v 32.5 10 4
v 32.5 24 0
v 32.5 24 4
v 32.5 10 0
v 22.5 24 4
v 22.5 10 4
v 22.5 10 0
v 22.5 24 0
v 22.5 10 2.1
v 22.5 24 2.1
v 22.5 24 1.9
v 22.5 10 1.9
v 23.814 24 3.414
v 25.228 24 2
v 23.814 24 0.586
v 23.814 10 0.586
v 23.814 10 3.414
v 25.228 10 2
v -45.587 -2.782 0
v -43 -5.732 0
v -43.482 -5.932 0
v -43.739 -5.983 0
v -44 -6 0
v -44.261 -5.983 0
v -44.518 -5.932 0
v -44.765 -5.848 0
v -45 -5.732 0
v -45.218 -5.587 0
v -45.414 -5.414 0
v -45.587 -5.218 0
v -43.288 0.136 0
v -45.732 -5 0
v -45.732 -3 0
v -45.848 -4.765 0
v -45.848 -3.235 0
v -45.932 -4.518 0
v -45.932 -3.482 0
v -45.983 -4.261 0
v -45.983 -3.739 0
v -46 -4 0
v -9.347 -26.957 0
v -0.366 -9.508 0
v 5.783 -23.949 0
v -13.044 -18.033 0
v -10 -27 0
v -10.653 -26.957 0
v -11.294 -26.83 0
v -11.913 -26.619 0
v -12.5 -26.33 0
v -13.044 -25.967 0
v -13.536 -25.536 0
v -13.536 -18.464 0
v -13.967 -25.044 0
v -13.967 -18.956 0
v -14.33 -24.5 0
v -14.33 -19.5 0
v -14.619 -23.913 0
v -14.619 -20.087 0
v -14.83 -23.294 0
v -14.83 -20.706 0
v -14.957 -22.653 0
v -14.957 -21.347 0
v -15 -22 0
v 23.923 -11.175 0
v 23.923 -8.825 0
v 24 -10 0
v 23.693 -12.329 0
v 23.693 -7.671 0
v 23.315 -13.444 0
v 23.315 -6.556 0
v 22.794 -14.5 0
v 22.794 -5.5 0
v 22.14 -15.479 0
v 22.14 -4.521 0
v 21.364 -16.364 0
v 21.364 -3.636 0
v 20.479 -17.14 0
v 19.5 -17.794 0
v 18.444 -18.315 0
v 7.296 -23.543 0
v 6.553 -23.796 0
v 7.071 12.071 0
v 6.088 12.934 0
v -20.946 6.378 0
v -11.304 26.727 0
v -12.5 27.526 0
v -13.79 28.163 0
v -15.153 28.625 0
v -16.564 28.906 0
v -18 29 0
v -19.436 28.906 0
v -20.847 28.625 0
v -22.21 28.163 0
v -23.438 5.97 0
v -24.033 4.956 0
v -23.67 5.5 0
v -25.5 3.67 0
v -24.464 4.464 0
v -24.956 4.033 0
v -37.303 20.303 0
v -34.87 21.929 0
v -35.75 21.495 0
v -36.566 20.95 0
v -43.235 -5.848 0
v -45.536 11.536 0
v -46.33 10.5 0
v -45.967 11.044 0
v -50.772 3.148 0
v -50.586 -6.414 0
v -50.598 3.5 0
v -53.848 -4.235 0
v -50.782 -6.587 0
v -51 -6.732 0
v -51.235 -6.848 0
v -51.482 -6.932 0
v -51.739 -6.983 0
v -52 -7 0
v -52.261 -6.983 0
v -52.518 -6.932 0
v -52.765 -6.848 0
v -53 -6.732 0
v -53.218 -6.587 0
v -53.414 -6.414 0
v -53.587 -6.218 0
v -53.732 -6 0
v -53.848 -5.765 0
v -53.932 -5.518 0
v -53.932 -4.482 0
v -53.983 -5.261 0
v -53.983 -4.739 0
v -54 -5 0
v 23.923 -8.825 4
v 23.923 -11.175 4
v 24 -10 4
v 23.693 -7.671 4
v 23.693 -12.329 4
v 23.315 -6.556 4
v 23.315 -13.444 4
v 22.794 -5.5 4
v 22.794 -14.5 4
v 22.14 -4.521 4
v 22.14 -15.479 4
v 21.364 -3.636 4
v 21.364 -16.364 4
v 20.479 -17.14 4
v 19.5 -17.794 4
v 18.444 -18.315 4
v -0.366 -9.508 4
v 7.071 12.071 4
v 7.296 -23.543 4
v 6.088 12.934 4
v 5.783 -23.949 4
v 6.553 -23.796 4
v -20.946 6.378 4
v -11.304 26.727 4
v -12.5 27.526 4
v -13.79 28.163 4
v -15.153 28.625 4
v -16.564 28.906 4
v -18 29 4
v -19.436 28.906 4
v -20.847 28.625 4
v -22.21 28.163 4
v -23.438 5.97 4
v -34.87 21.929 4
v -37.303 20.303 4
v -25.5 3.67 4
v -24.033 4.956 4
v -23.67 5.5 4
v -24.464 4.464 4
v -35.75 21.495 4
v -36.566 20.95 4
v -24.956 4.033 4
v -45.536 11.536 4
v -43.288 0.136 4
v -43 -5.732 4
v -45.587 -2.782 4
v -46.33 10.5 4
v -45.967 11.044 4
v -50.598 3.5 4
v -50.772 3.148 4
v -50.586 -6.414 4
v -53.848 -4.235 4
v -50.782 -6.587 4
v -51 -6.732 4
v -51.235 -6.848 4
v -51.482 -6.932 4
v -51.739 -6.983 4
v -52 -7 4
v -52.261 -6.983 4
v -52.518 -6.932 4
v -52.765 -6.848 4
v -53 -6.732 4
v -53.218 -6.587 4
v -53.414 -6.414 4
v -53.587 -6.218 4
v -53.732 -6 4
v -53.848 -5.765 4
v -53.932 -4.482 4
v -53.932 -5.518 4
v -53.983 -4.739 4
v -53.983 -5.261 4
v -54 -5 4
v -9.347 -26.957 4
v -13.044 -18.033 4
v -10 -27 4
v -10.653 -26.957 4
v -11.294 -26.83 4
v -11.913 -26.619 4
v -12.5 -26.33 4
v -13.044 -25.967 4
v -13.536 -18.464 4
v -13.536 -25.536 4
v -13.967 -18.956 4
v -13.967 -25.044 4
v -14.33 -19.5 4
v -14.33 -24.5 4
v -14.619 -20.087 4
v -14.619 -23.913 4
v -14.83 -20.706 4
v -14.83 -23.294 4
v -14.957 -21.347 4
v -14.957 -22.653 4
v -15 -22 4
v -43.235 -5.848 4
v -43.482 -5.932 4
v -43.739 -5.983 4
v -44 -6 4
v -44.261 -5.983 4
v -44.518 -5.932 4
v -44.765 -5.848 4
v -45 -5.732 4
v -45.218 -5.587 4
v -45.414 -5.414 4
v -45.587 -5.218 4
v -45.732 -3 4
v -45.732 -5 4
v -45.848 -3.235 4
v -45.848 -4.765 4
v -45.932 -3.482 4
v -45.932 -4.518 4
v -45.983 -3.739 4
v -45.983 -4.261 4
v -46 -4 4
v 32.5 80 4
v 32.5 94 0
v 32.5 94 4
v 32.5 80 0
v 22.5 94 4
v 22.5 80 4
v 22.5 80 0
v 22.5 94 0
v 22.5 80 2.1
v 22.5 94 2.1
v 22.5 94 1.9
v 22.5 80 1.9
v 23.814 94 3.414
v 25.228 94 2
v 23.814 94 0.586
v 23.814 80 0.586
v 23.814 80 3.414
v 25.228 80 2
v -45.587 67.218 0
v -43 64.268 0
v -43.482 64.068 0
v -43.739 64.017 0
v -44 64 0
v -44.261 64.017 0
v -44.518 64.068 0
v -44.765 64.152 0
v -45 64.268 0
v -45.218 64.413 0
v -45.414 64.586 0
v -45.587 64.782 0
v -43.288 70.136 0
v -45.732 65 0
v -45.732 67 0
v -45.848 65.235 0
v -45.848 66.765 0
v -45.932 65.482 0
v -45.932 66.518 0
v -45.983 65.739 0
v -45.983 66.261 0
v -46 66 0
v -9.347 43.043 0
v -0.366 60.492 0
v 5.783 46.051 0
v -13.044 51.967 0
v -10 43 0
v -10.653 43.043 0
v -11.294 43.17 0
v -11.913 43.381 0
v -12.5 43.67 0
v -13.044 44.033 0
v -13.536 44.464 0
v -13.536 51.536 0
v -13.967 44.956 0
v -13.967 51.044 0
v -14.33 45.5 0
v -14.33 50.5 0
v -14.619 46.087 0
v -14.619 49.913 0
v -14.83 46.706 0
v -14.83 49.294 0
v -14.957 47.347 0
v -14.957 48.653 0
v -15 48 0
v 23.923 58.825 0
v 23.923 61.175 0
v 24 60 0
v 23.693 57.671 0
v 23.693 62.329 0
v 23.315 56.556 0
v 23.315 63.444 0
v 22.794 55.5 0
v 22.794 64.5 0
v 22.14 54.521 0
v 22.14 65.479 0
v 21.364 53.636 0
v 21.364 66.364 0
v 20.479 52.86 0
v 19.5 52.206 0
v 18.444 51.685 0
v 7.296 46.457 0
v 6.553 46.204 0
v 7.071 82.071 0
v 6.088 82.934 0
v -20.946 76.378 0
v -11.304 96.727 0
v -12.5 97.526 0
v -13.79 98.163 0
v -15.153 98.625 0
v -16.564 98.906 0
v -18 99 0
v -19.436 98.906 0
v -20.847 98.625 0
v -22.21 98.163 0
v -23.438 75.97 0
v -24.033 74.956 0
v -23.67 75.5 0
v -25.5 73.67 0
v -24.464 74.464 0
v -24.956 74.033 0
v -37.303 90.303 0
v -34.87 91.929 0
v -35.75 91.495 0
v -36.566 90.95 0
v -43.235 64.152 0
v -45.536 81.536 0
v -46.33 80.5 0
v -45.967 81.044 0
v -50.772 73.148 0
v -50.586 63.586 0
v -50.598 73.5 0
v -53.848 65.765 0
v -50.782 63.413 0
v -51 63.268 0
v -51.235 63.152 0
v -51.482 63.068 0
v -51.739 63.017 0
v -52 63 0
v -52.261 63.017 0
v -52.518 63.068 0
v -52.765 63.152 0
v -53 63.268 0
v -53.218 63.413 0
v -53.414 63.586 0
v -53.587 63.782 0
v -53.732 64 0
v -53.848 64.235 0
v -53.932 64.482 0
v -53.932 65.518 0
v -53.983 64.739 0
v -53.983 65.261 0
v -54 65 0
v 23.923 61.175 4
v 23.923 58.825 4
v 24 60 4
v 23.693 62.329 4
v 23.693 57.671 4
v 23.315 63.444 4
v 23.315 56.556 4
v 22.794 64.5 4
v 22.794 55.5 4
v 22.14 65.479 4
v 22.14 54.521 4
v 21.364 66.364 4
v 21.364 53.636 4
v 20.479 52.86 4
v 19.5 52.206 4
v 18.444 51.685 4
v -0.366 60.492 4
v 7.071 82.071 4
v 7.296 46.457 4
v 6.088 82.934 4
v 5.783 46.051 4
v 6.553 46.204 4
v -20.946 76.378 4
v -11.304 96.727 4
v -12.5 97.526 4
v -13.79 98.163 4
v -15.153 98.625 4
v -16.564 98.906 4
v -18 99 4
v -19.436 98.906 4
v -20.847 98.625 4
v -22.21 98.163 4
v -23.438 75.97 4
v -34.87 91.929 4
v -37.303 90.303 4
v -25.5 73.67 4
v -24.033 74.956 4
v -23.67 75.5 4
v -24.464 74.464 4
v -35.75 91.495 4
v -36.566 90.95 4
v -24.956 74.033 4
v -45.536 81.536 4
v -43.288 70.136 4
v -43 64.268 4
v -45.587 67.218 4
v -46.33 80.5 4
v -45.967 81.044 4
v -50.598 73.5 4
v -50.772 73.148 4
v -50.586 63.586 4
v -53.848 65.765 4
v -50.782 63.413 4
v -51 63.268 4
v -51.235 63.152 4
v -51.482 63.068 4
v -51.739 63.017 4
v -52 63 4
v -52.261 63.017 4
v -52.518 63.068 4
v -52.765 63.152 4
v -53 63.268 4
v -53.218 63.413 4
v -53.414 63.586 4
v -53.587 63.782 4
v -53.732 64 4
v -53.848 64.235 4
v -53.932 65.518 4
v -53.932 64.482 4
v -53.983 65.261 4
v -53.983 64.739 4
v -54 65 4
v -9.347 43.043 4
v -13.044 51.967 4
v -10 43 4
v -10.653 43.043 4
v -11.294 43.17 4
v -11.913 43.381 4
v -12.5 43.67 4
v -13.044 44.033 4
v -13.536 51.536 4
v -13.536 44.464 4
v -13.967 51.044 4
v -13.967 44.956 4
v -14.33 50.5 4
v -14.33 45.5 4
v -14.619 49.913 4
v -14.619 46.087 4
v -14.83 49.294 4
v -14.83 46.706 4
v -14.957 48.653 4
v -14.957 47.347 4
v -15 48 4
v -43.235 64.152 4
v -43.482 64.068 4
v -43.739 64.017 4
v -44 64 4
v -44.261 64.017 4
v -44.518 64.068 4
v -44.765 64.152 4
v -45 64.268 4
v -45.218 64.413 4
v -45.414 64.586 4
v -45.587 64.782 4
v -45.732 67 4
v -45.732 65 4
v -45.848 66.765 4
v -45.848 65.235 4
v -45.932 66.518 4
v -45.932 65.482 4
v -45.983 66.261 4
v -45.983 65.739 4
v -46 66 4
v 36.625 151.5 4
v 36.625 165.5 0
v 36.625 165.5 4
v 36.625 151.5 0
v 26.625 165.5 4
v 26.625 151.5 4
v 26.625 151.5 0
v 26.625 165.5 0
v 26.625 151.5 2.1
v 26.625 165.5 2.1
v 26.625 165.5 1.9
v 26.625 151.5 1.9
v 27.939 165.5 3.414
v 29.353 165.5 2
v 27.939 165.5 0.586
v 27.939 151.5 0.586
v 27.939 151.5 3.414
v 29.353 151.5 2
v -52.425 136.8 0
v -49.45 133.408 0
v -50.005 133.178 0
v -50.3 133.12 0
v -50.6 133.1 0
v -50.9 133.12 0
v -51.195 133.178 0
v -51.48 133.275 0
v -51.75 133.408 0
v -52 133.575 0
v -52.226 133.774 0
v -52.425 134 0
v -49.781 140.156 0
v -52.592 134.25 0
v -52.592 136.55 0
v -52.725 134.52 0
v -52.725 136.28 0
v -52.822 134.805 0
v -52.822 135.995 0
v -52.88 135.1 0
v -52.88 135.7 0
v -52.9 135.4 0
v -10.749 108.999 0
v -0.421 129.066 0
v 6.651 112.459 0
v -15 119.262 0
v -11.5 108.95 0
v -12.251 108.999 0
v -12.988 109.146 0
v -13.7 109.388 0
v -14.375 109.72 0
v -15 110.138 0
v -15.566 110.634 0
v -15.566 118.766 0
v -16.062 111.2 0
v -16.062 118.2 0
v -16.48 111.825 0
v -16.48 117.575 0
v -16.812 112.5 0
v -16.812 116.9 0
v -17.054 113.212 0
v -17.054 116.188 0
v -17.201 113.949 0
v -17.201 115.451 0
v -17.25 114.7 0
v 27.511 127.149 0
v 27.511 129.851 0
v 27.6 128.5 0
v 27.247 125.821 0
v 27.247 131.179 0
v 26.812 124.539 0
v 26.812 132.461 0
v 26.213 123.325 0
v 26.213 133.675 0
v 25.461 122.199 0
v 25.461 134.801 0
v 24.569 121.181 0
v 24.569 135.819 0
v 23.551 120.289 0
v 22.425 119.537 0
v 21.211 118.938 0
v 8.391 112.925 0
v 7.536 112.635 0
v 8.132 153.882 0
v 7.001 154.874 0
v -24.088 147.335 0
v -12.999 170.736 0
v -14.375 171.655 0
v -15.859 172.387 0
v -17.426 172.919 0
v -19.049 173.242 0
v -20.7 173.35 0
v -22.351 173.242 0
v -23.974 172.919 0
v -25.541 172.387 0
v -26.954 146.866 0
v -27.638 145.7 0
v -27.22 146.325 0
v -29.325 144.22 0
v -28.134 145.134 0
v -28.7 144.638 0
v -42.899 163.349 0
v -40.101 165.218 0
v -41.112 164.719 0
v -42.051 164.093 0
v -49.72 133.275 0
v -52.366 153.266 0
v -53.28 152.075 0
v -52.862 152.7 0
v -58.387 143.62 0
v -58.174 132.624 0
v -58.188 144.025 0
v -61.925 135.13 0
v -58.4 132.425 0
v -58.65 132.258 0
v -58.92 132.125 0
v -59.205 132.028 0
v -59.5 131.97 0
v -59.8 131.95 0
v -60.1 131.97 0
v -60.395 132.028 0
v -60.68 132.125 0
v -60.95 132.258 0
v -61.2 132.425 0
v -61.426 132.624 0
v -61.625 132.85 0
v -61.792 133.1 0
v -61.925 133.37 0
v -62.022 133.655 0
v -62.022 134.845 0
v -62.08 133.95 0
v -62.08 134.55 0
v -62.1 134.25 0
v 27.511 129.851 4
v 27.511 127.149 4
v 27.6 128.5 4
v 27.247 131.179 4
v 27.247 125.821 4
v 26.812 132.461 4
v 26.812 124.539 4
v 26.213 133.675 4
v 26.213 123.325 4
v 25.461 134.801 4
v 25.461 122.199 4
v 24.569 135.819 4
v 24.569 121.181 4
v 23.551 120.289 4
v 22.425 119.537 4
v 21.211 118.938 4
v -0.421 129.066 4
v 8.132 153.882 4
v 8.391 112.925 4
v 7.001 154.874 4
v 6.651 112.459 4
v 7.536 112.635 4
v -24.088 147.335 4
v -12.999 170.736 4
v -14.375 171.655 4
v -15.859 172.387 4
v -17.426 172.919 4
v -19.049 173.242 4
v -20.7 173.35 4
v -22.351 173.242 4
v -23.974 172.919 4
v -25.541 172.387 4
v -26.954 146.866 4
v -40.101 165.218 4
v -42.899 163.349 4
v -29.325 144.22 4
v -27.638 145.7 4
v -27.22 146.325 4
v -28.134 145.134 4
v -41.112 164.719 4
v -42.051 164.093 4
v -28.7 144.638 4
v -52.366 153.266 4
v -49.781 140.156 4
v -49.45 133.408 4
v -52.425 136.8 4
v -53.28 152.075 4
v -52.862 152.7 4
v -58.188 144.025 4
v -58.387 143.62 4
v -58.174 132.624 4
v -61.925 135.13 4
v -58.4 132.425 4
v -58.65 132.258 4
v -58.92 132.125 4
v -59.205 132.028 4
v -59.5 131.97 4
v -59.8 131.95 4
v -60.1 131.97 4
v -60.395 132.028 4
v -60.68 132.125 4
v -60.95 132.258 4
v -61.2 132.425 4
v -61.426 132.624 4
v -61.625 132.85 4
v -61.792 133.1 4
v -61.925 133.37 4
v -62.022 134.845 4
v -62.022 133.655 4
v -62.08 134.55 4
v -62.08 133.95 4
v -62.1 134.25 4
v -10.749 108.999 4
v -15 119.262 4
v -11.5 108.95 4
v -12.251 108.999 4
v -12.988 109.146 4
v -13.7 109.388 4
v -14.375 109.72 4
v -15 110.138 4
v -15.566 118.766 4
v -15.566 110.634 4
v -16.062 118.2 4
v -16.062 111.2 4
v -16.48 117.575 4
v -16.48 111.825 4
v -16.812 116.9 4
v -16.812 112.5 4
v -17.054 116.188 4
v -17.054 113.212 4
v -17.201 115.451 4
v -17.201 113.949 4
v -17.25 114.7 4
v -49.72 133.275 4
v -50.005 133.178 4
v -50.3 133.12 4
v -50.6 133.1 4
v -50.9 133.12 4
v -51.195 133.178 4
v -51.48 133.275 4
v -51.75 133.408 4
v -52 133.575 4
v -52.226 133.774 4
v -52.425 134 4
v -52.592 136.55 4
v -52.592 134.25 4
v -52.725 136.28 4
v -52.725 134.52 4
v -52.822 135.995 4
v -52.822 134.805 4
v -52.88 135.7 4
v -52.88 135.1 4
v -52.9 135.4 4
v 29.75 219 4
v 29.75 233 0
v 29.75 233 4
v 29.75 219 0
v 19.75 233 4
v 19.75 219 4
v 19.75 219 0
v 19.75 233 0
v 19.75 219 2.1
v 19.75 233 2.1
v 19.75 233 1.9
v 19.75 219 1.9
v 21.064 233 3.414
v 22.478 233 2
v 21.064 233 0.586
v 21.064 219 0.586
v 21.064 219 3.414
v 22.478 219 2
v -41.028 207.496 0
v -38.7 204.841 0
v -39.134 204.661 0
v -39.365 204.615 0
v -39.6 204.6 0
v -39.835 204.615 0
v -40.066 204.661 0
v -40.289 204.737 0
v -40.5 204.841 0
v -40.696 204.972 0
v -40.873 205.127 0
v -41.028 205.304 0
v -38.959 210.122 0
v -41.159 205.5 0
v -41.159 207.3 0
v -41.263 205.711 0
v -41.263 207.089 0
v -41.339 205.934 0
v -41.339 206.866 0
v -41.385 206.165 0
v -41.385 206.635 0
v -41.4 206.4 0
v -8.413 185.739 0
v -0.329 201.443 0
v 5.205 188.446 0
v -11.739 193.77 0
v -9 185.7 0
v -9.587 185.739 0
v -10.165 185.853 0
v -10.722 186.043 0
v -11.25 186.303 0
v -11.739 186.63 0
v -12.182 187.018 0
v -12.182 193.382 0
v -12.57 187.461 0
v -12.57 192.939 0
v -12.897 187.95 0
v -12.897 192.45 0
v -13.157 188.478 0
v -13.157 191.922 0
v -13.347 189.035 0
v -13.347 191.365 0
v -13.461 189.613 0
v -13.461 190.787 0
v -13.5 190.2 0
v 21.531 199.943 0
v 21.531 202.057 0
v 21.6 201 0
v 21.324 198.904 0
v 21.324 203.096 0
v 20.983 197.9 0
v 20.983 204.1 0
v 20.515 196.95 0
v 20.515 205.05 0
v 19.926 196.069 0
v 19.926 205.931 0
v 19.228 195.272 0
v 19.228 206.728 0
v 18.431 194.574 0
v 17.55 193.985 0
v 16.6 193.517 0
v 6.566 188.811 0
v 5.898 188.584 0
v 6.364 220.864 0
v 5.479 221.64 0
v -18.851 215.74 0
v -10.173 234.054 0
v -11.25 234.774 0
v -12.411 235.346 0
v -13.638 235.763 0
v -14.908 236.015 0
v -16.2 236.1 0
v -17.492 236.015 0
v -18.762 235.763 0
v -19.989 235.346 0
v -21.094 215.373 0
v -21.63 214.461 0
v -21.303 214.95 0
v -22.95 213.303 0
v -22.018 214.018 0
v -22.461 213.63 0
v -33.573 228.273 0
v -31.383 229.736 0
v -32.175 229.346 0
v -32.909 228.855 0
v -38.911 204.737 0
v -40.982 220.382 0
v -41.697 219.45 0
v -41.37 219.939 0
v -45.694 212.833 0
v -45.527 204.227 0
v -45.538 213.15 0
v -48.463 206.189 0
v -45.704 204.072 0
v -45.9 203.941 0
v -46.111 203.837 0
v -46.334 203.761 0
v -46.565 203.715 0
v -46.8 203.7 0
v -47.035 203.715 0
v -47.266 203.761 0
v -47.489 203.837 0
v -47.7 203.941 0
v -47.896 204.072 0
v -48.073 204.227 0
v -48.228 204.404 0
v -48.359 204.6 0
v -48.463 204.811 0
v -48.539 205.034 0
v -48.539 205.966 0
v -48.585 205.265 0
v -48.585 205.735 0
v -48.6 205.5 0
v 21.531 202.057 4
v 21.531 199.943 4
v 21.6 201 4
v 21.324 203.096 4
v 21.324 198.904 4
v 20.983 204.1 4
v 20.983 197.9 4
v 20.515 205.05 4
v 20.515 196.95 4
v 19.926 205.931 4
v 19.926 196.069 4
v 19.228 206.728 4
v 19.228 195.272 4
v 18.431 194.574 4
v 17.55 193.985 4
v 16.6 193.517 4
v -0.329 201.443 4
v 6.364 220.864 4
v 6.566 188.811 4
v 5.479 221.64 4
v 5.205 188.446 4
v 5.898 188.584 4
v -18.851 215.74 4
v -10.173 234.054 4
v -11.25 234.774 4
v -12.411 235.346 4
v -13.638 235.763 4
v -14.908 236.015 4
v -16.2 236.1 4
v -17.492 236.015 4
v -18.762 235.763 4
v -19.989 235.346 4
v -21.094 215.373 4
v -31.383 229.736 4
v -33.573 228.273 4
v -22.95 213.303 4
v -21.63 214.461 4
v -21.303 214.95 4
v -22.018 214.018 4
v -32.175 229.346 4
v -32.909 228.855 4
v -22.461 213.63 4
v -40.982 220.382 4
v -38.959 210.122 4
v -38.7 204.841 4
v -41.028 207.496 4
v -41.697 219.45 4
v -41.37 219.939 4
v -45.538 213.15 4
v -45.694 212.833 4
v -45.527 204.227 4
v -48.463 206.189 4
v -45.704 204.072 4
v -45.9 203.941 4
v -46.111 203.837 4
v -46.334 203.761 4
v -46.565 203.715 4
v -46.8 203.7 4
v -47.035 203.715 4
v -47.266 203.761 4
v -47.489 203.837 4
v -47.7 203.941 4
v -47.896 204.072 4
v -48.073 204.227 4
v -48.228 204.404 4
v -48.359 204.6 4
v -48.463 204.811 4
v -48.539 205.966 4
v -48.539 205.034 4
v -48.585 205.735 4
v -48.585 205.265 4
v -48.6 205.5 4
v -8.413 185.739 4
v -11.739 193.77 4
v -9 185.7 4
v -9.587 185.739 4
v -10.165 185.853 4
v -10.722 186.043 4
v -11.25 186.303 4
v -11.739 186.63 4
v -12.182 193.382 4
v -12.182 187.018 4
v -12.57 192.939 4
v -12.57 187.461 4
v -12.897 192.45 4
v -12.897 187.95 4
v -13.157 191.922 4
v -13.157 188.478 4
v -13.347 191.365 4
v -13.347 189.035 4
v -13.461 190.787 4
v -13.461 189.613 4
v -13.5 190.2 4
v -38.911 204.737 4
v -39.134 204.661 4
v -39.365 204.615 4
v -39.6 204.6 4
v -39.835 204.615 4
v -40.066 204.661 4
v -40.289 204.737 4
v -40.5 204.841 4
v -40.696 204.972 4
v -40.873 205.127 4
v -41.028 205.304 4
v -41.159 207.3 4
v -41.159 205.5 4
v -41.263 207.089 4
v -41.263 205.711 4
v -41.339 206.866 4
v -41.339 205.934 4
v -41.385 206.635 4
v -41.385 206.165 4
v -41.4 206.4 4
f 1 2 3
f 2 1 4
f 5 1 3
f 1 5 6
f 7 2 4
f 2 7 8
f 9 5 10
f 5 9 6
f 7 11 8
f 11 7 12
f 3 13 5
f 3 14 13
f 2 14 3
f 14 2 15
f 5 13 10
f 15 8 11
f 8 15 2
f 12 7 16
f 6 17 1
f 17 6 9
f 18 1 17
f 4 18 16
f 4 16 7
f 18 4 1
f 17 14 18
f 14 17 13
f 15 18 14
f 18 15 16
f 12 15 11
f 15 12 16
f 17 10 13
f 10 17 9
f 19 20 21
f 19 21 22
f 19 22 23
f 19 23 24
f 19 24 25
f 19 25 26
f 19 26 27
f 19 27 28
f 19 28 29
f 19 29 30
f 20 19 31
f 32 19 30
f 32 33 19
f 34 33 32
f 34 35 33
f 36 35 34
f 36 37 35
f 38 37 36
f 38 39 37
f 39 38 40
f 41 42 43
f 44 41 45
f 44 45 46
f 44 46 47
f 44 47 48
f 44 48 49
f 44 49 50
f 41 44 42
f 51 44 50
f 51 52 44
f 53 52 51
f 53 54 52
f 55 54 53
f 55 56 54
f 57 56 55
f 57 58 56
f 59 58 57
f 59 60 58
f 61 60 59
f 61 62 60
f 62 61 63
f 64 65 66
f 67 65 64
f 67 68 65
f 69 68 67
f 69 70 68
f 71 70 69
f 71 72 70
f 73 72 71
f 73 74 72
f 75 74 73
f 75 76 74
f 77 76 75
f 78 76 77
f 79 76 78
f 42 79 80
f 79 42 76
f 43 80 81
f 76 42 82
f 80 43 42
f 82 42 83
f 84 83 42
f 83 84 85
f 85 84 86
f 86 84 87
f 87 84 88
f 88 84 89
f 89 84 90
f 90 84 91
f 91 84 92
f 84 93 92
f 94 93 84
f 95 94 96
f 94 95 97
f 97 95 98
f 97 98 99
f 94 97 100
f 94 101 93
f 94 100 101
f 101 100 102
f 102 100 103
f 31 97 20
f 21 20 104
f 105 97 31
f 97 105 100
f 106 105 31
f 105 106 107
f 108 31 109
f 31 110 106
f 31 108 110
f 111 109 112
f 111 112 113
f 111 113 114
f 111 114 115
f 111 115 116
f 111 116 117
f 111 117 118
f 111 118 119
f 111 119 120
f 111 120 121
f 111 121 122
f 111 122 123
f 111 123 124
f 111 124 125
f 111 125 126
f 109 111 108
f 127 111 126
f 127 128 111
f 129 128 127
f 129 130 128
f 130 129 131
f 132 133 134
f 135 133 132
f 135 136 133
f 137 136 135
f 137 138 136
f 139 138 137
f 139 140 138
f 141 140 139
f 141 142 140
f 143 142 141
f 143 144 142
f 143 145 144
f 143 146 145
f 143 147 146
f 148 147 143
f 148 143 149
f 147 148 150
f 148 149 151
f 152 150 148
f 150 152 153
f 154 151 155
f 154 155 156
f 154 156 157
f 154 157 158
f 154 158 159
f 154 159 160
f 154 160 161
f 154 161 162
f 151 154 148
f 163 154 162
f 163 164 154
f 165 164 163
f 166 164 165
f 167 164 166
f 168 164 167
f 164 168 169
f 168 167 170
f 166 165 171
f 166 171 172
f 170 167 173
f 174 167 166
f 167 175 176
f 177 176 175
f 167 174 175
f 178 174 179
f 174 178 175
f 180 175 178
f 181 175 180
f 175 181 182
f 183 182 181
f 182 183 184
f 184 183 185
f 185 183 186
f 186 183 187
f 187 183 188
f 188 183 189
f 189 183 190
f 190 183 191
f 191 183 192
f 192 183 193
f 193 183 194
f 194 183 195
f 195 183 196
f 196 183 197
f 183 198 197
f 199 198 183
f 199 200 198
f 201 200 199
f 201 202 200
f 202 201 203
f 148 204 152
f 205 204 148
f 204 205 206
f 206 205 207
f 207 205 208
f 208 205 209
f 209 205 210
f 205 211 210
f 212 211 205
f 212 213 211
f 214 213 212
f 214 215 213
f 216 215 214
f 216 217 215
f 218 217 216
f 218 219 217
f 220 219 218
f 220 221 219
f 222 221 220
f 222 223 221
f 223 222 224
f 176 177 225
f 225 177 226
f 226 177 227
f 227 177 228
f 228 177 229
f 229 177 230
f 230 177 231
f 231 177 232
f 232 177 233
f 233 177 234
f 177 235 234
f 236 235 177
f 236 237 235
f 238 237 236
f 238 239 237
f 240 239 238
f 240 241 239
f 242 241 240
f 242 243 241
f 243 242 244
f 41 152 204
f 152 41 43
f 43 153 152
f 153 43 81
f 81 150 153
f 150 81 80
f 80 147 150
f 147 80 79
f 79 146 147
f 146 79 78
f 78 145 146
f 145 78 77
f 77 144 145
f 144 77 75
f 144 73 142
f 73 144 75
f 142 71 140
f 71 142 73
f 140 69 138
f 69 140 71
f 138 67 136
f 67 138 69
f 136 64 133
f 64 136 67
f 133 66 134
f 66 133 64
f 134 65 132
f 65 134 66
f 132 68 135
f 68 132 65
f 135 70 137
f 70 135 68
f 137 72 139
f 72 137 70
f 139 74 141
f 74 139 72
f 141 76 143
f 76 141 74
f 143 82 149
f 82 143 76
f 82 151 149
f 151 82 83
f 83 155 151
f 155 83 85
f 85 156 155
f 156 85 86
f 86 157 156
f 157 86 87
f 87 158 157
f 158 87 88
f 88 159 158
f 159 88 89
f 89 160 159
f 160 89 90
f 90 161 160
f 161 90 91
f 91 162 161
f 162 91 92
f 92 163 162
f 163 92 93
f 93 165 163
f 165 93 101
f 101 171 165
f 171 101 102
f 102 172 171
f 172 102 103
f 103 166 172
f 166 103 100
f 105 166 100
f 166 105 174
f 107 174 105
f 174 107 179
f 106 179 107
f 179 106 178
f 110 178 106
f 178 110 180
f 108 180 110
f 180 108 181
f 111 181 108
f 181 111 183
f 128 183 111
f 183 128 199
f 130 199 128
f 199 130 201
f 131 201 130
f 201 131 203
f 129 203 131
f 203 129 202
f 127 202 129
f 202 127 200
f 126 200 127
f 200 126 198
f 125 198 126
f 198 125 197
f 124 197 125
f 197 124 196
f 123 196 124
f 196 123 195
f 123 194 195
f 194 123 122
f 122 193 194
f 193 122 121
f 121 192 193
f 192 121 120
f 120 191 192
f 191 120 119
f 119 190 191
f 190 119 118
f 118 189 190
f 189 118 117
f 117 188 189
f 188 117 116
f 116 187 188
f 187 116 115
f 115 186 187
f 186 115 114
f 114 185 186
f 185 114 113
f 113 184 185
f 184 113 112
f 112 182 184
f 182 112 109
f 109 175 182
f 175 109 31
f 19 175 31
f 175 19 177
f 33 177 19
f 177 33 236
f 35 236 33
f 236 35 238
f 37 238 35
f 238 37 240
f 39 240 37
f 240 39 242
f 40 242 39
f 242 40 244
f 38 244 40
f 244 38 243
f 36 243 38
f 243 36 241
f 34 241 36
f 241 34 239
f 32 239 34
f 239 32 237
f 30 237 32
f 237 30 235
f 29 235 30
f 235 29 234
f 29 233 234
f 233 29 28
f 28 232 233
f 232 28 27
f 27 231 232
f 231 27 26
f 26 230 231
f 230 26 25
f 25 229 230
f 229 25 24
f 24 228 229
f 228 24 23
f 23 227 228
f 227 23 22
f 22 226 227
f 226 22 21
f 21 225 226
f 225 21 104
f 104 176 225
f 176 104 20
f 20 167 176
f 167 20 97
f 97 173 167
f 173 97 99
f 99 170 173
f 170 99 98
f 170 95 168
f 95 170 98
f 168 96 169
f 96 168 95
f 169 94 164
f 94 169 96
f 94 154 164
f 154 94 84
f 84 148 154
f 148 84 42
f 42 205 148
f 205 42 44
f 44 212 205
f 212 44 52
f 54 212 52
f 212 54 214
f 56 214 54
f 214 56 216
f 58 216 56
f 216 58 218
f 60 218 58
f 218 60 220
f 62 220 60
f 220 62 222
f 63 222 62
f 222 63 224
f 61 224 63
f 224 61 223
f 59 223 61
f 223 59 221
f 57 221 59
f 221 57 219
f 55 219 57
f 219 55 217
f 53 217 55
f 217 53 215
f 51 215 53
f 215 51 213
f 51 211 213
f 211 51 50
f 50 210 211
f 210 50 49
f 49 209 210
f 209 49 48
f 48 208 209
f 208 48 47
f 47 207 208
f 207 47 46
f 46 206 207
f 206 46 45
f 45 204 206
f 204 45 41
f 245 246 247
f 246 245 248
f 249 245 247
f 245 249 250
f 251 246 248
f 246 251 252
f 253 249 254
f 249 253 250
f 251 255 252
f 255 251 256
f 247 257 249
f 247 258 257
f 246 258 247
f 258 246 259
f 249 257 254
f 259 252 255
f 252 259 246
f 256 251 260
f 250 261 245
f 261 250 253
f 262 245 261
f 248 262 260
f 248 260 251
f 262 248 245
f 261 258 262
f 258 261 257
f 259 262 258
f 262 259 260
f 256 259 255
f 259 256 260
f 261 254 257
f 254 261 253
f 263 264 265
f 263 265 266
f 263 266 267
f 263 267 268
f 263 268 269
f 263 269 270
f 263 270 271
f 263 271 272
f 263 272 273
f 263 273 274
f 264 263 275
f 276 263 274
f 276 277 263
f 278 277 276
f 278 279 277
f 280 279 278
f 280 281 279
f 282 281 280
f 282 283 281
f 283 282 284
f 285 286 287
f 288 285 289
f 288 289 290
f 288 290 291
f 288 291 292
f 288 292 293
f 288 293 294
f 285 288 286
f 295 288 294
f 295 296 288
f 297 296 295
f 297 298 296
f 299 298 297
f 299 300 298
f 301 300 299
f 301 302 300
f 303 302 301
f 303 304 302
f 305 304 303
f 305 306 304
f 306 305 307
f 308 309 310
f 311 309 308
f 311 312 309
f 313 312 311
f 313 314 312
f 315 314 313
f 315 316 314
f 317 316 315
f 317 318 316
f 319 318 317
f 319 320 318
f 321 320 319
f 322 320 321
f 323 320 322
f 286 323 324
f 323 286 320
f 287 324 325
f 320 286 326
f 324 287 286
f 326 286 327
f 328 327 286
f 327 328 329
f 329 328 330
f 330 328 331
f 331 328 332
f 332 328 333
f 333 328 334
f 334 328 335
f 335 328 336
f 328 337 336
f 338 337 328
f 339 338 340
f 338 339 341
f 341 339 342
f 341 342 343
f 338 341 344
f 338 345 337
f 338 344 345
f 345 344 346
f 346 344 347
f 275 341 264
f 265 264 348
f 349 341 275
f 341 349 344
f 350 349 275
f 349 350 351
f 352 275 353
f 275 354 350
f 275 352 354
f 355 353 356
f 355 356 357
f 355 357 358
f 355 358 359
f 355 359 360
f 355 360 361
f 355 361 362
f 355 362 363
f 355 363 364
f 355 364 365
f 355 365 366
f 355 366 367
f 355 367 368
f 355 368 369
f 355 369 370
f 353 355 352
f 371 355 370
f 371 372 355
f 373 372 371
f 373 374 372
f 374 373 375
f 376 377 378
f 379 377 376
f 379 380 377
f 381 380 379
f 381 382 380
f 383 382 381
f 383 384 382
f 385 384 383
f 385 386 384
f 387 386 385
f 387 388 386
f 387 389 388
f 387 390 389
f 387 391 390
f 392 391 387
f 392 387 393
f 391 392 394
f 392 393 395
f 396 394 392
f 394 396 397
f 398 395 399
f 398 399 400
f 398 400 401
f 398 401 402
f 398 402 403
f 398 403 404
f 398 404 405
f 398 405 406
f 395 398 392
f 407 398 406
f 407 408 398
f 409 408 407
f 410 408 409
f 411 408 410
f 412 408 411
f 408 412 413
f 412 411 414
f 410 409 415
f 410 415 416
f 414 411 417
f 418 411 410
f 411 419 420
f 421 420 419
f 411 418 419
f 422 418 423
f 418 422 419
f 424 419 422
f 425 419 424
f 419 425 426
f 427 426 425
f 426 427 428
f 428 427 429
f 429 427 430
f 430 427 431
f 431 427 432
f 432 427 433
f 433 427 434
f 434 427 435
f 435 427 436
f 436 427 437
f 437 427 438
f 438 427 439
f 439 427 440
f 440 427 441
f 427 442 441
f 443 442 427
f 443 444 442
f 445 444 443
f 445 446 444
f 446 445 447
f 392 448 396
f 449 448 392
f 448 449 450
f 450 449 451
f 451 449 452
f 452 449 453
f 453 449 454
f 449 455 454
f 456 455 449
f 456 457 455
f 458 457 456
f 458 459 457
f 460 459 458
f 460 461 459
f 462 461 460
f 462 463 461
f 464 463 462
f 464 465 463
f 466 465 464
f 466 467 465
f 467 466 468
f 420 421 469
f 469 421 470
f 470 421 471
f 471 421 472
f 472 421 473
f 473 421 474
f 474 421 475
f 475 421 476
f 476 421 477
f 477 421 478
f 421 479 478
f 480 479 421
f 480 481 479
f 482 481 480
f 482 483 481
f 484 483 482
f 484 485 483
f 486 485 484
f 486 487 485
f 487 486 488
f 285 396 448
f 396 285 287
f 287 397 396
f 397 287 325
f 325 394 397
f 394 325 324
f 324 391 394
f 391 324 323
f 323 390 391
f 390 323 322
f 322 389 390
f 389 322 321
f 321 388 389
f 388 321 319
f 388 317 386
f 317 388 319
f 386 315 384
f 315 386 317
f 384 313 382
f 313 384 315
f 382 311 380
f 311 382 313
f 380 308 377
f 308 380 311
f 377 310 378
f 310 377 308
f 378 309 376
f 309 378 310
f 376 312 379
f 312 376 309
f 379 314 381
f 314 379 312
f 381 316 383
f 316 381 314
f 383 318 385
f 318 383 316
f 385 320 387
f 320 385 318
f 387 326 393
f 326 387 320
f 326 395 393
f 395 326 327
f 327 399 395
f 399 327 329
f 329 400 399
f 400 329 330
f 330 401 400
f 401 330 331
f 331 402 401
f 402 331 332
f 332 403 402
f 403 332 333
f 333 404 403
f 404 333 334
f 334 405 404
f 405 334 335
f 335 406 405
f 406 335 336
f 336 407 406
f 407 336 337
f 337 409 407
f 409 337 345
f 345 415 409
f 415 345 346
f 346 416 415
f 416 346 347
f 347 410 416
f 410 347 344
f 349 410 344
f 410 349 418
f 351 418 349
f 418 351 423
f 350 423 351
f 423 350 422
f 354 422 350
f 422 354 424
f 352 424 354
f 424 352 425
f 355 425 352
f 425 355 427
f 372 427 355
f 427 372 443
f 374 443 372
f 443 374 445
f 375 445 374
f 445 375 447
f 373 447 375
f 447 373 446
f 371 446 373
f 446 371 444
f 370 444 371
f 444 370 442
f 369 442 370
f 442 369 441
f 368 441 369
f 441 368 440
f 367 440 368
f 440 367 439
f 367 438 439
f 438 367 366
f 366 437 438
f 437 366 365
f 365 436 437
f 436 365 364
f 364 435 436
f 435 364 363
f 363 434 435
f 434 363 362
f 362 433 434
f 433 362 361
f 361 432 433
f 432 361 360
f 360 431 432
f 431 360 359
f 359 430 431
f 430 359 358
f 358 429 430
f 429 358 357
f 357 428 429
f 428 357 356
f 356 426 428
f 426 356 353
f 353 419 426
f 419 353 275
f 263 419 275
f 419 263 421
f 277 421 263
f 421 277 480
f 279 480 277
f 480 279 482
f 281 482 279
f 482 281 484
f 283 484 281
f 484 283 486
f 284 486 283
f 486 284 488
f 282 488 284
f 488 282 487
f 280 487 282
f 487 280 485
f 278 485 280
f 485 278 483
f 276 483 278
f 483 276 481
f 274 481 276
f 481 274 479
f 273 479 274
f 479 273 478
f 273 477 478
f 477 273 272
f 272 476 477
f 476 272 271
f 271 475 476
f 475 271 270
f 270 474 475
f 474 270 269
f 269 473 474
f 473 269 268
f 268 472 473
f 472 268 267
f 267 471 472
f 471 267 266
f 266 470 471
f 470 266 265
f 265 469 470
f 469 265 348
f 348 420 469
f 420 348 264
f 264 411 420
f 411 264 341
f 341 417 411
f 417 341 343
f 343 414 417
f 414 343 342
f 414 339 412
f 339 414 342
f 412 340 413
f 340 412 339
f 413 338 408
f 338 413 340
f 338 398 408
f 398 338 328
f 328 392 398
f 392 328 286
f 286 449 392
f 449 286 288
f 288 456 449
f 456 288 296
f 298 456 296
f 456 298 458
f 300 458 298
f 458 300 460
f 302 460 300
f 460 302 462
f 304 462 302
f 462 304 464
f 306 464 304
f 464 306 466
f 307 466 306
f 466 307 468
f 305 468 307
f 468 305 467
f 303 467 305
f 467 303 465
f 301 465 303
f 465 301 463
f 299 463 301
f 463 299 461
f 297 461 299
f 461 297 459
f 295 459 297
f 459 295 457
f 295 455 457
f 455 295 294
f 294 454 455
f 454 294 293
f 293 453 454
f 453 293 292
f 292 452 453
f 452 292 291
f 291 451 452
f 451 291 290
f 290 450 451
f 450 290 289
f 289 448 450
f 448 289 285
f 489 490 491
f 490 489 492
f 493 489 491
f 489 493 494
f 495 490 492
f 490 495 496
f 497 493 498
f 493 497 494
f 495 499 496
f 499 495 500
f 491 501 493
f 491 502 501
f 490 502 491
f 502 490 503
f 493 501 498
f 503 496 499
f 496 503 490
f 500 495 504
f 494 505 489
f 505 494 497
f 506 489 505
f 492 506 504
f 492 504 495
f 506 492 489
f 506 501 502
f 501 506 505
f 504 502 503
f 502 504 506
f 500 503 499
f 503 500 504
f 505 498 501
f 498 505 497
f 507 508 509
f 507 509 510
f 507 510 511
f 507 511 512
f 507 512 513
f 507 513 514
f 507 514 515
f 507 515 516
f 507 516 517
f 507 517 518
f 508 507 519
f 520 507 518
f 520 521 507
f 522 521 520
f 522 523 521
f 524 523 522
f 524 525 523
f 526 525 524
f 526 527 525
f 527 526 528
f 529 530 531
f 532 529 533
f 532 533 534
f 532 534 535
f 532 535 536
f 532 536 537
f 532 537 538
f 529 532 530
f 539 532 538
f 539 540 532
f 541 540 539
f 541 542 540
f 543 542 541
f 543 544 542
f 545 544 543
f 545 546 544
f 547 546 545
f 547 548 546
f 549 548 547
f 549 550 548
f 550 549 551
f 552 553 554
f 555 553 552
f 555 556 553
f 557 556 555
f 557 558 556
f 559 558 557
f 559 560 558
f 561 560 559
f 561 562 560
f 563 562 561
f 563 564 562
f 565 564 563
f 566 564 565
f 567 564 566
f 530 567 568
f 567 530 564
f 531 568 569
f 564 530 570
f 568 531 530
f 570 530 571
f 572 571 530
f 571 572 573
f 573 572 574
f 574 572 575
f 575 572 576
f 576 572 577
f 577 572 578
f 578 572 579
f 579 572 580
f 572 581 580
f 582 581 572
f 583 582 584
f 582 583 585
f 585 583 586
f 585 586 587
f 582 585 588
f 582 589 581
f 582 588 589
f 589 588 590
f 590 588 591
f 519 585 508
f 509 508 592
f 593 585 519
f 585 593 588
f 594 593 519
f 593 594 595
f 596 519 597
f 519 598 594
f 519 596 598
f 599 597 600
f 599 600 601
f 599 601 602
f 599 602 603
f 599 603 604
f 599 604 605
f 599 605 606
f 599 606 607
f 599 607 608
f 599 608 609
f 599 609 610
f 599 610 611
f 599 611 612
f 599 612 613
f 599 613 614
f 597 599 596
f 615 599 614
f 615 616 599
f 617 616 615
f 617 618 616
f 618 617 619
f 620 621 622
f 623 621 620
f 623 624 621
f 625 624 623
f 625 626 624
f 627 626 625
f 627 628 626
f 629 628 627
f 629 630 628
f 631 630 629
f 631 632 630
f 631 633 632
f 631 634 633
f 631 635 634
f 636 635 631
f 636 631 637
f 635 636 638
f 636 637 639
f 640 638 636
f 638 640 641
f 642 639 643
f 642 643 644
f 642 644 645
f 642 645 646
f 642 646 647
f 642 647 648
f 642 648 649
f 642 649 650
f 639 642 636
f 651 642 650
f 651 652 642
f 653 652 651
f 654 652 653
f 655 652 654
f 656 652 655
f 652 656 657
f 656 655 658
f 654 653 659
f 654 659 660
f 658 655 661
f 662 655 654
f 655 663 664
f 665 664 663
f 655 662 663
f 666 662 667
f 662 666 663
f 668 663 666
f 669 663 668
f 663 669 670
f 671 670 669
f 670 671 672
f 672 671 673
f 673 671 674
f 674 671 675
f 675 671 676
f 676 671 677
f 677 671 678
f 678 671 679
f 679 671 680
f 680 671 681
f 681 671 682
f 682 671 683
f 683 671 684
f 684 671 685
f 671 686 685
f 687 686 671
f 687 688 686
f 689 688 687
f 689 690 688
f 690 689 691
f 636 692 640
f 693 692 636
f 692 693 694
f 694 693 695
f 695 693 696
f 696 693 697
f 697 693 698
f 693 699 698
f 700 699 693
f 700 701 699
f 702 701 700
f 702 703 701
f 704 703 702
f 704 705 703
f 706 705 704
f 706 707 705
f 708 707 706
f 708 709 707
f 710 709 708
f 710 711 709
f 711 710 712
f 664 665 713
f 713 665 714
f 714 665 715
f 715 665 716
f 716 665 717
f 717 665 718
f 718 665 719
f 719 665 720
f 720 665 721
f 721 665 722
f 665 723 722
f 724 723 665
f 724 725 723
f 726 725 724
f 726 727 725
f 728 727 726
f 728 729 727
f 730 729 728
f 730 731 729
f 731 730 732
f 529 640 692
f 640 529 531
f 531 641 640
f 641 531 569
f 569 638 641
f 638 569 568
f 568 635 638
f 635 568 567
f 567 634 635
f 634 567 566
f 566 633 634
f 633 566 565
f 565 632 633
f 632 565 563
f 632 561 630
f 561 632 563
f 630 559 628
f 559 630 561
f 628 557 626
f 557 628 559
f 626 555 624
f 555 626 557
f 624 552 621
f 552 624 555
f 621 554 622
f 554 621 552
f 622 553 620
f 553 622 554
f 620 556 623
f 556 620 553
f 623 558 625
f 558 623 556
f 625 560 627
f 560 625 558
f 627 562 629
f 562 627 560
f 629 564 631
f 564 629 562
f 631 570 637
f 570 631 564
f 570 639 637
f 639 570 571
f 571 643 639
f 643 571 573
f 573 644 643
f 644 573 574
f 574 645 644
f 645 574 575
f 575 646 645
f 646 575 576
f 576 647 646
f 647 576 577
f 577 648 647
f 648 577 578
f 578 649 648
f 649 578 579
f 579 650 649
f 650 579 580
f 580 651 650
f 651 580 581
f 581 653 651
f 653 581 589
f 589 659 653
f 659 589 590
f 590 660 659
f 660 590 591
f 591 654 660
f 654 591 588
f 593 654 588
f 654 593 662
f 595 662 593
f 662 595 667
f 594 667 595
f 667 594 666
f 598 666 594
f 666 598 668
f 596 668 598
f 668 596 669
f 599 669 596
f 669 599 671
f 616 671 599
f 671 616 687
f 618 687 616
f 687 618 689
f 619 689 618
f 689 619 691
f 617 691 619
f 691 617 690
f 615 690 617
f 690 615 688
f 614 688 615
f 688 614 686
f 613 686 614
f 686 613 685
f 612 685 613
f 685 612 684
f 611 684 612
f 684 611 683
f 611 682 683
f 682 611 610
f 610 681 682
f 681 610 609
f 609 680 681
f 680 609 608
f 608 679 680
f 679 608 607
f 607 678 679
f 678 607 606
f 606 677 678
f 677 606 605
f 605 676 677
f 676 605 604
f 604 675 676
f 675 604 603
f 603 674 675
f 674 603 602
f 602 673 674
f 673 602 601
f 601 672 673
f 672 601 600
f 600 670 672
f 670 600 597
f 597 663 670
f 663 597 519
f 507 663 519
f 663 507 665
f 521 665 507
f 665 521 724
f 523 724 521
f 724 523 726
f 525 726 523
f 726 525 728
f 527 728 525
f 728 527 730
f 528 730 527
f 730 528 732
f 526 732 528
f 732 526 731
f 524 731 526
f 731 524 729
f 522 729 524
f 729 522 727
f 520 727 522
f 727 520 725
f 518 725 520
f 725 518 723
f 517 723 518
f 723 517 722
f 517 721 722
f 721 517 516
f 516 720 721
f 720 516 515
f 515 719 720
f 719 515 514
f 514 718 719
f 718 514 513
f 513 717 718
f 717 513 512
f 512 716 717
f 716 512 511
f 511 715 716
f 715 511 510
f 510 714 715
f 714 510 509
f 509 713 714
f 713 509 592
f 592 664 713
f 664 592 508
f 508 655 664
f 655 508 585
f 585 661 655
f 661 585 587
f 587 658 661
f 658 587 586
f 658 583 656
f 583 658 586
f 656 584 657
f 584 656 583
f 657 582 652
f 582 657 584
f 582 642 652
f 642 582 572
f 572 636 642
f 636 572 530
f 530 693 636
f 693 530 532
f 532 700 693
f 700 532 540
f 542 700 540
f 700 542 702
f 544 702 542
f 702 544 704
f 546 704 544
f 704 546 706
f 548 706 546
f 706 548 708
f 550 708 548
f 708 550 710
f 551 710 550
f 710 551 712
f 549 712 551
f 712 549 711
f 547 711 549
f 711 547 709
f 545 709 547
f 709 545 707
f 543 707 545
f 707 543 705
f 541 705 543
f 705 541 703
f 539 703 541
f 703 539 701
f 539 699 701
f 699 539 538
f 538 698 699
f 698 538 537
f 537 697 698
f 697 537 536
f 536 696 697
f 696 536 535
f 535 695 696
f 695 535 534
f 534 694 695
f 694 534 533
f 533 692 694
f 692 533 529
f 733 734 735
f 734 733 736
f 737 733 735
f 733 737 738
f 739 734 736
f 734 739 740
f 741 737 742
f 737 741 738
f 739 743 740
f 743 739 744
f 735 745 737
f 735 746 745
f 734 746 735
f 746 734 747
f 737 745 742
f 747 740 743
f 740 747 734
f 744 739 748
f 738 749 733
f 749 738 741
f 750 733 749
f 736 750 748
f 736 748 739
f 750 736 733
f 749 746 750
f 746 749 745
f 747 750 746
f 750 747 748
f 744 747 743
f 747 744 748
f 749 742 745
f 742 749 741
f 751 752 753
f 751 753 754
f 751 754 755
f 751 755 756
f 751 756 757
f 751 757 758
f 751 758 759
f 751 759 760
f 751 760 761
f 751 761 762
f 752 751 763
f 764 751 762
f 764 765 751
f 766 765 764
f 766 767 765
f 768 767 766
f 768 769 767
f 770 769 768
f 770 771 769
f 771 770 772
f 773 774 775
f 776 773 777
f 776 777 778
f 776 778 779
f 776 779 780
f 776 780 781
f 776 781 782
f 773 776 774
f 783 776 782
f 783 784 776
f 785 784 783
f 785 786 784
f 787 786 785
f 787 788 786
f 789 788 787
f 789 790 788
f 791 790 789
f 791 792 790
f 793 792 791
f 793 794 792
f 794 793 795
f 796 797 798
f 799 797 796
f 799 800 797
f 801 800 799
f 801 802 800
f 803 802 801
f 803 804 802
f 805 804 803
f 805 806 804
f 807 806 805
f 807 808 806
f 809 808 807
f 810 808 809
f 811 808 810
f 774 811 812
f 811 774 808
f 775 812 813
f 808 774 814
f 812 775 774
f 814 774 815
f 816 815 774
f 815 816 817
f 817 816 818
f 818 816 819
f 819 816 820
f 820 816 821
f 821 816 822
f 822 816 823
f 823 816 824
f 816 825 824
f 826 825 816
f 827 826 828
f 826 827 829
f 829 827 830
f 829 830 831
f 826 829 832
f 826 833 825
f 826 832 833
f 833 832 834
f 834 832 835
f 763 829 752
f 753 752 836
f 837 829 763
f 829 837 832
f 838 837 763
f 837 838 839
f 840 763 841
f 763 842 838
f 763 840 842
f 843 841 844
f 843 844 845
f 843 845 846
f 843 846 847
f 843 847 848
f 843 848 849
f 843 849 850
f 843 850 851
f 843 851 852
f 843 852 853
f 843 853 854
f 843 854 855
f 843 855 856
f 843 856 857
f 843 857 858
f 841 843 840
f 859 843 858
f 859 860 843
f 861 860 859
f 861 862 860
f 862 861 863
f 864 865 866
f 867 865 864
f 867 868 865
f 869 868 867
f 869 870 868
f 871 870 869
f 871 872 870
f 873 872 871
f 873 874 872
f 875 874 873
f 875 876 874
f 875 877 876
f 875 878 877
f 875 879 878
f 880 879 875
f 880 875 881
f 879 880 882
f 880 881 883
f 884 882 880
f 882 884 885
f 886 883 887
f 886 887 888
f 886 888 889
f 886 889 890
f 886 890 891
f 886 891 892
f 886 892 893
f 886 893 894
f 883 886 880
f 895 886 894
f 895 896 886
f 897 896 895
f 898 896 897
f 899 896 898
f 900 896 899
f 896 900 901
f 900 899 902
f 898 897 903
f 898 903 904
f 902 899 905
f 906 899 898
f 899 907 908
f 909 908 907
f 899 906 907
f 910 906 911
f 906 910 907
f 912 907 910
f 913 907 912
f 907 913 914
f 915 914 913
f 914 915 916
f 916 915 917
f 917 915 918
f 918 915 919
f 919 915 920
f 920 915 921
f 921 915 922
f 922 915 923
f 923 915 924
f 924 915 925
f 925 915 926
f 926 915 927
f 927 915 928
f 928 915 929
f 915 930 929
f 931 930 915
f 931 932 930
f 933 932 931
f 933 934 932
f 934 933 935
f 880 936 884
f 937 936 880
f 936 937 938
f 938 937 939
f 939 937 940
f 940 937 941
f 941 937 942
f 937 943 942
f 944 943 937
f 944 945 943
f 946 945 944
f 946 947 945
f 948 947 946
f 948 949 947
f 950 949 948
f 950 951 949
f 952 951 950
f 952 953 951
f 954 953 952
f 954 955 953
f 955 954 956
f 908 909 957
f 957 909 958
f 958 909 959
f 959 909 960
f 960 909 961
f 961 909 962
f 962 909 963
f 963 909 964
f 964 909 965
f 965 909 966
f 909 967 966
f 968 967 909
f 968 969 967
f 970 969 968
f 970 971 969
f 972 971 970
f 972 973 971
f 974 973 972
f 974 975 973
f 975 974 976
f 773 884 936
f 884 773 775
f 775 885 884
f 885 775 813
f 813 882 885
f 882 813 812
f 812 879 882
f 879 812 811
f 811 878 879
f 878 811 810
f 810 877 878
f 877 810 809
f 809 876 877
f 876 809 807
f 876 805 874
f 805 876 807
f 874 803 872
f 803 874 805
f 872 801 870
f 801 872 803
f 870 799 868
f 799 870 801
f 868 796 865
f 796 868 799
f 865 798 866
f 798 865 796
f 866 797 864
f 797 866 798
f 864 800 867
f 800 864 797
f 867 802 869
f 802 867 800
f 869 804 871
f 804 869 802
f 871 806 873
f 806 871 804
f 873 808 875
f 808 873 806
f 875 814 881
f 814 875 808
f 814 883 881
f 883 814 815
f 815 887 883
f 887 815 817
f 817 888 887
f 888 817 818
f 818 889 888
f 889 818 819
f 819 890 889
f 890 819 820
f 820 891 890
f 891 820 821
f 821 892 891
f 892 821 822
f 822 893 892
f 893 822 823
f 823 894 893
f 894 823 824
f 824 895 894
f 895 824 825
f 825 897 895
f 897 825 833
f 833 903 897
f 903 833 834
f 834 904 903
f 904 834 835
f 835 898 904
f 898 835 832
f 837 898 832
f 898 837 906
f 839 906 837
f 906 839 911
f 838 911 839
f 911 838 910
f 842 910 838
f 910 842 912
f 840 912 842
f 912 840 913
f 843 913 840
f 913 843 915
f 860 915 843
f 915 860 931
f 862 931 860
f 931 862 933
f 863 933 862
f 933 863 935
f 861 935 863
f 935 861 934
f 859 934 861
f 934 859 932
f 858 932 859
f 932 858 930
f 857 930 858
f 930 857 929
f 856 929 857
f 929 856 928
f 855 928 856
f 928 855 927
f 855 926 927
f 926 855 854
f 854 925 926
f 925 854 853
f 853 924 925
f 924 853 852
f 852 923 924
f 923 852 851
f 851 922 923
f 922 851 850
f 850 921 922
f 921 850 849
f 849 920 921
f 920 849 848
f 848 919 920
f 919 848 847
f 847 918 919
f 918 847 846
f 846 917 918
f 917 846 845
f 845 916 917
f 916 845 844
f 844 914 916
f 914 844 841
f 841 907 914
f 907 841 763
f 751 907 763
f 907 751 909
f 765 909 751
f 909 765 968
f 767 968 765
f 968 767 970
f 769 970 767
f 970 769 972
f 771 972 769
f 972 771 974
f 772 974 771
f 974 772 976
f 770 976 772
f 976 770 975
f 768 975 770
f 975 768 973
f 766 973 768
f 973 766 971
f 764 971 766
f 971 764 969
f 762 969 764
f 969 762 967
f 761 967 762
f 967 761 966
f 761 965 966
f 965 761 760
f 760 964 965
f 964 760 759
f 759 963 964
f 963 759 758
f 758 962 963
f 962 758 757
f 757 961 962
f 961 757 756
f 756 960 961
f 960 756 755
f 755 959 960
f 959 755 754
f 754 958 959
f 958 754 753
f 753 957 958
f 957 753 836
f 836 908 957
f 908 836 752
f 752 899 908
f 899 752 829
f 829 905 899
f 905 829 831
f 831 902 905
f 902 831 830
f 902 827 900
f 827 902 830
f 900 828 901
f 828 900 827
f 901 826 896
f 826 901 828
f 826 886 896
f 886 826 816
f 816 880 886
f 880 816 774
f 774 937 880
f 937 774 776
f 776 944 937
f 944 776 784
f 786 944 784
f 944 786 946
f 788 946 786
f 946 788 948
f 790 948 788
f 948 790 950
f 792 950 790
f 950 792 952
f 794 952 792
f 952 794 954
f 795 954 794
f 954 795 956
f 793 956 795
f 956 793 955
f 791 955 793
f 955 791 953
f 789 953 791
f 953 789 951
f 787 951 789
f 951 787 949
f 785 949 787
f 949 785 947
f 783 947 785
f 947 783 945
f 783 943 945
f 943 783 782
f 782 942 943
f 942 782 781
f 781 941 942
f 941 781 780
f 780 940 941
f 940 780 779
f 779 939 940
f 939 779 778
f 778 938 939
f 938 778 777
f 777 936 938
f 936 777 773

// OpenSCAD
/*
 * WAVE LAYER: CURL (Layer 1 - Middle)
 * ====================================
 *
 * Light blue, curling wave tip - the iconic Hokusai shape
 * 2D profile extruded to 4mm thickness
 * Mounting tab on right edge for slider connection
 *
 * Print: 3x (one per wave)
 * Material: Any color PLA/PETG
 * Layer height: 0.2mm
 * Infill: 15%
 */

include <../common.scad>

// ============================================
// CURL PROFILE PARAMETERS
// ============================================

// Base dimensions (before scaling)
CURL_WIDTH = 55;           // X extent
CURL_HEIGHT = 45;          // Z extent (when upright)

// Tab position on profile
TAB_ATTACH_Z = 10;         // Height above profile bottom

// ============================================
// MAIN MODULE - CURL LAYER
// ============================================

module wave_layer_curl(scale = 1.0) {
    /*
     * Complete curl layer with mounting tab
     * Oriented for printing: flat on build plate
     * Assembly: rotate 90 degrees to stand upright
     */

    color(C_CURL)
    union() {
        // Main wave profile
        linear_extrude(height = LAYER_THICKNESS)
            curl_profile_2d(scale);

        // Mounting tab (integral with profile)
        translate([CURL_WIDTH/2 * scale - 5, TAB_ATTACH_Z * scale, 0])
            mounting_tab(scale);
    }
}

// ============================================
// 2D CURL PROFILE
// ============================================

module curl_profile_2d(scale = 1.0) {
    /*
     * Hokusai wave curl shape
     * The iconic curling "finger" of the wave
     * Creates the distinctive breaking wave appearance
     */

    s = scale;

    scale([s, s])
    union() {
        // Main curl body - rising part
        hull() {
            translate([15, -10]) circle(d = 18);
            translate([0, 5]) circle(d = 20);
            translate([-18, 18]) circle(d = 22);
        }

        // Curl overhang - the characteristic finger
        hull() {
            translate([-18, 18]) circle(d = 22);
            translate([-32, 15]) circle(d = 15);
            translate([-42, 8]) circle(d = 10);
        }

        // Curl tip - tapering end
        hull() {
            translate([-42, 8]) circle(d = 10);
            translate([-48, 2]) circle(d = 6);
            translate([-52, -5]) circle(d = 4);
        }

        // Inner curl detail - secondary curve
        hull() {
            translate([-28, 8]) circle(d = 10);
            translate([-38, 2]) circle(d = 6);
            translate([-44, -4]) circle(d = 4);
        }

        // Base connection
        hull() {
            translate([15, -10]) circle(d = 18);
            translate([5, -18]) circle(d = 12);
            translate([-10, -22]) circle(d = 10);
        }
    }
}

// ============================================
// MOUNTING TAB
// ============================================

module mounting_tab(scale = 1.0) {
    /*
     * Tab that inserts into slider slot
     * Provides rigid connection to slider mechanism
     */

    tab_width = PROFILE_TAB_WIDTH;
    tab_height = PROFILE_TAB_HEIGHT;
    tab_thick = LAYER_THICKNESS;

    // Tab body
    difference() {
        cube([tab_width, tab_height, tab_thick]);

        // Chamfer entry edge for easy insertion
        translate([-0.1, -0.1, tab_thick/2])
        rotate([0, 45, 0])
            cube([2, tab_height + 0.2, 2]);
    }

    // Retention bump (snap fit)
    translate([tab_width - 2, tab_height/2, tab_thick/2])
    rotate([90, 0, 0])
        cylinder(d = 1.5, h = 4, center = true, $fn = 12);
}

// ============================================
// CURL LAYER FOR SPECIFIC WAVE
// ============================================

module curl_layer_wave(wave_num) {
    /*
     * Curl layer scaled for specific wave number
     */
    wave_layer_curl(wave_scale(wave_num));
}

// ============================================
// PRINTABLE ORIENTATION
// ============================================

module curl_layer_printable(scale = 1.0) {
    /*
     * Oriented flat for 3D printing
     * Profile lies in XY plane, thickness in Z
     */
    wave_layer_curl(scale);
}

// ============================================
// RENDER PREVIEW
// ============================================

// Show single layer
wave_layer_curl(1.0);

// Show all three wave variants
translate([0, 70, 0]) {
    echo("Wave 0 (scale 1.0):");
    curl_layer_wave(0);
}

translate([0, 140, 0]) {
    echo("Wave 1 (scale 1.15):");
    curl_layer_wave(1);
}

translate([0, 210, 0]) {
    echo("Wave 2 (scale 0.9):");
    curl_layer_wave(2);
}

// Info
echo("============================================");
echo("WAVE LAYER: CURL");
echo("============================================");
echo(str("Profile thickness: ", LAYER_THICKNESS, "mm"));
echo(str("Base dimensions: ~", CURL_WIDTH, " x ", CURL_HEIGHT, "mm"));
echo(str("Tab size: ", PROFILE_TAB_WIDTH, " x ", PROFILE_TAB_HEIGHT, "mm"));
echo("Print: 3 copies (one per wave, at different scales)");
echo("============================================");
